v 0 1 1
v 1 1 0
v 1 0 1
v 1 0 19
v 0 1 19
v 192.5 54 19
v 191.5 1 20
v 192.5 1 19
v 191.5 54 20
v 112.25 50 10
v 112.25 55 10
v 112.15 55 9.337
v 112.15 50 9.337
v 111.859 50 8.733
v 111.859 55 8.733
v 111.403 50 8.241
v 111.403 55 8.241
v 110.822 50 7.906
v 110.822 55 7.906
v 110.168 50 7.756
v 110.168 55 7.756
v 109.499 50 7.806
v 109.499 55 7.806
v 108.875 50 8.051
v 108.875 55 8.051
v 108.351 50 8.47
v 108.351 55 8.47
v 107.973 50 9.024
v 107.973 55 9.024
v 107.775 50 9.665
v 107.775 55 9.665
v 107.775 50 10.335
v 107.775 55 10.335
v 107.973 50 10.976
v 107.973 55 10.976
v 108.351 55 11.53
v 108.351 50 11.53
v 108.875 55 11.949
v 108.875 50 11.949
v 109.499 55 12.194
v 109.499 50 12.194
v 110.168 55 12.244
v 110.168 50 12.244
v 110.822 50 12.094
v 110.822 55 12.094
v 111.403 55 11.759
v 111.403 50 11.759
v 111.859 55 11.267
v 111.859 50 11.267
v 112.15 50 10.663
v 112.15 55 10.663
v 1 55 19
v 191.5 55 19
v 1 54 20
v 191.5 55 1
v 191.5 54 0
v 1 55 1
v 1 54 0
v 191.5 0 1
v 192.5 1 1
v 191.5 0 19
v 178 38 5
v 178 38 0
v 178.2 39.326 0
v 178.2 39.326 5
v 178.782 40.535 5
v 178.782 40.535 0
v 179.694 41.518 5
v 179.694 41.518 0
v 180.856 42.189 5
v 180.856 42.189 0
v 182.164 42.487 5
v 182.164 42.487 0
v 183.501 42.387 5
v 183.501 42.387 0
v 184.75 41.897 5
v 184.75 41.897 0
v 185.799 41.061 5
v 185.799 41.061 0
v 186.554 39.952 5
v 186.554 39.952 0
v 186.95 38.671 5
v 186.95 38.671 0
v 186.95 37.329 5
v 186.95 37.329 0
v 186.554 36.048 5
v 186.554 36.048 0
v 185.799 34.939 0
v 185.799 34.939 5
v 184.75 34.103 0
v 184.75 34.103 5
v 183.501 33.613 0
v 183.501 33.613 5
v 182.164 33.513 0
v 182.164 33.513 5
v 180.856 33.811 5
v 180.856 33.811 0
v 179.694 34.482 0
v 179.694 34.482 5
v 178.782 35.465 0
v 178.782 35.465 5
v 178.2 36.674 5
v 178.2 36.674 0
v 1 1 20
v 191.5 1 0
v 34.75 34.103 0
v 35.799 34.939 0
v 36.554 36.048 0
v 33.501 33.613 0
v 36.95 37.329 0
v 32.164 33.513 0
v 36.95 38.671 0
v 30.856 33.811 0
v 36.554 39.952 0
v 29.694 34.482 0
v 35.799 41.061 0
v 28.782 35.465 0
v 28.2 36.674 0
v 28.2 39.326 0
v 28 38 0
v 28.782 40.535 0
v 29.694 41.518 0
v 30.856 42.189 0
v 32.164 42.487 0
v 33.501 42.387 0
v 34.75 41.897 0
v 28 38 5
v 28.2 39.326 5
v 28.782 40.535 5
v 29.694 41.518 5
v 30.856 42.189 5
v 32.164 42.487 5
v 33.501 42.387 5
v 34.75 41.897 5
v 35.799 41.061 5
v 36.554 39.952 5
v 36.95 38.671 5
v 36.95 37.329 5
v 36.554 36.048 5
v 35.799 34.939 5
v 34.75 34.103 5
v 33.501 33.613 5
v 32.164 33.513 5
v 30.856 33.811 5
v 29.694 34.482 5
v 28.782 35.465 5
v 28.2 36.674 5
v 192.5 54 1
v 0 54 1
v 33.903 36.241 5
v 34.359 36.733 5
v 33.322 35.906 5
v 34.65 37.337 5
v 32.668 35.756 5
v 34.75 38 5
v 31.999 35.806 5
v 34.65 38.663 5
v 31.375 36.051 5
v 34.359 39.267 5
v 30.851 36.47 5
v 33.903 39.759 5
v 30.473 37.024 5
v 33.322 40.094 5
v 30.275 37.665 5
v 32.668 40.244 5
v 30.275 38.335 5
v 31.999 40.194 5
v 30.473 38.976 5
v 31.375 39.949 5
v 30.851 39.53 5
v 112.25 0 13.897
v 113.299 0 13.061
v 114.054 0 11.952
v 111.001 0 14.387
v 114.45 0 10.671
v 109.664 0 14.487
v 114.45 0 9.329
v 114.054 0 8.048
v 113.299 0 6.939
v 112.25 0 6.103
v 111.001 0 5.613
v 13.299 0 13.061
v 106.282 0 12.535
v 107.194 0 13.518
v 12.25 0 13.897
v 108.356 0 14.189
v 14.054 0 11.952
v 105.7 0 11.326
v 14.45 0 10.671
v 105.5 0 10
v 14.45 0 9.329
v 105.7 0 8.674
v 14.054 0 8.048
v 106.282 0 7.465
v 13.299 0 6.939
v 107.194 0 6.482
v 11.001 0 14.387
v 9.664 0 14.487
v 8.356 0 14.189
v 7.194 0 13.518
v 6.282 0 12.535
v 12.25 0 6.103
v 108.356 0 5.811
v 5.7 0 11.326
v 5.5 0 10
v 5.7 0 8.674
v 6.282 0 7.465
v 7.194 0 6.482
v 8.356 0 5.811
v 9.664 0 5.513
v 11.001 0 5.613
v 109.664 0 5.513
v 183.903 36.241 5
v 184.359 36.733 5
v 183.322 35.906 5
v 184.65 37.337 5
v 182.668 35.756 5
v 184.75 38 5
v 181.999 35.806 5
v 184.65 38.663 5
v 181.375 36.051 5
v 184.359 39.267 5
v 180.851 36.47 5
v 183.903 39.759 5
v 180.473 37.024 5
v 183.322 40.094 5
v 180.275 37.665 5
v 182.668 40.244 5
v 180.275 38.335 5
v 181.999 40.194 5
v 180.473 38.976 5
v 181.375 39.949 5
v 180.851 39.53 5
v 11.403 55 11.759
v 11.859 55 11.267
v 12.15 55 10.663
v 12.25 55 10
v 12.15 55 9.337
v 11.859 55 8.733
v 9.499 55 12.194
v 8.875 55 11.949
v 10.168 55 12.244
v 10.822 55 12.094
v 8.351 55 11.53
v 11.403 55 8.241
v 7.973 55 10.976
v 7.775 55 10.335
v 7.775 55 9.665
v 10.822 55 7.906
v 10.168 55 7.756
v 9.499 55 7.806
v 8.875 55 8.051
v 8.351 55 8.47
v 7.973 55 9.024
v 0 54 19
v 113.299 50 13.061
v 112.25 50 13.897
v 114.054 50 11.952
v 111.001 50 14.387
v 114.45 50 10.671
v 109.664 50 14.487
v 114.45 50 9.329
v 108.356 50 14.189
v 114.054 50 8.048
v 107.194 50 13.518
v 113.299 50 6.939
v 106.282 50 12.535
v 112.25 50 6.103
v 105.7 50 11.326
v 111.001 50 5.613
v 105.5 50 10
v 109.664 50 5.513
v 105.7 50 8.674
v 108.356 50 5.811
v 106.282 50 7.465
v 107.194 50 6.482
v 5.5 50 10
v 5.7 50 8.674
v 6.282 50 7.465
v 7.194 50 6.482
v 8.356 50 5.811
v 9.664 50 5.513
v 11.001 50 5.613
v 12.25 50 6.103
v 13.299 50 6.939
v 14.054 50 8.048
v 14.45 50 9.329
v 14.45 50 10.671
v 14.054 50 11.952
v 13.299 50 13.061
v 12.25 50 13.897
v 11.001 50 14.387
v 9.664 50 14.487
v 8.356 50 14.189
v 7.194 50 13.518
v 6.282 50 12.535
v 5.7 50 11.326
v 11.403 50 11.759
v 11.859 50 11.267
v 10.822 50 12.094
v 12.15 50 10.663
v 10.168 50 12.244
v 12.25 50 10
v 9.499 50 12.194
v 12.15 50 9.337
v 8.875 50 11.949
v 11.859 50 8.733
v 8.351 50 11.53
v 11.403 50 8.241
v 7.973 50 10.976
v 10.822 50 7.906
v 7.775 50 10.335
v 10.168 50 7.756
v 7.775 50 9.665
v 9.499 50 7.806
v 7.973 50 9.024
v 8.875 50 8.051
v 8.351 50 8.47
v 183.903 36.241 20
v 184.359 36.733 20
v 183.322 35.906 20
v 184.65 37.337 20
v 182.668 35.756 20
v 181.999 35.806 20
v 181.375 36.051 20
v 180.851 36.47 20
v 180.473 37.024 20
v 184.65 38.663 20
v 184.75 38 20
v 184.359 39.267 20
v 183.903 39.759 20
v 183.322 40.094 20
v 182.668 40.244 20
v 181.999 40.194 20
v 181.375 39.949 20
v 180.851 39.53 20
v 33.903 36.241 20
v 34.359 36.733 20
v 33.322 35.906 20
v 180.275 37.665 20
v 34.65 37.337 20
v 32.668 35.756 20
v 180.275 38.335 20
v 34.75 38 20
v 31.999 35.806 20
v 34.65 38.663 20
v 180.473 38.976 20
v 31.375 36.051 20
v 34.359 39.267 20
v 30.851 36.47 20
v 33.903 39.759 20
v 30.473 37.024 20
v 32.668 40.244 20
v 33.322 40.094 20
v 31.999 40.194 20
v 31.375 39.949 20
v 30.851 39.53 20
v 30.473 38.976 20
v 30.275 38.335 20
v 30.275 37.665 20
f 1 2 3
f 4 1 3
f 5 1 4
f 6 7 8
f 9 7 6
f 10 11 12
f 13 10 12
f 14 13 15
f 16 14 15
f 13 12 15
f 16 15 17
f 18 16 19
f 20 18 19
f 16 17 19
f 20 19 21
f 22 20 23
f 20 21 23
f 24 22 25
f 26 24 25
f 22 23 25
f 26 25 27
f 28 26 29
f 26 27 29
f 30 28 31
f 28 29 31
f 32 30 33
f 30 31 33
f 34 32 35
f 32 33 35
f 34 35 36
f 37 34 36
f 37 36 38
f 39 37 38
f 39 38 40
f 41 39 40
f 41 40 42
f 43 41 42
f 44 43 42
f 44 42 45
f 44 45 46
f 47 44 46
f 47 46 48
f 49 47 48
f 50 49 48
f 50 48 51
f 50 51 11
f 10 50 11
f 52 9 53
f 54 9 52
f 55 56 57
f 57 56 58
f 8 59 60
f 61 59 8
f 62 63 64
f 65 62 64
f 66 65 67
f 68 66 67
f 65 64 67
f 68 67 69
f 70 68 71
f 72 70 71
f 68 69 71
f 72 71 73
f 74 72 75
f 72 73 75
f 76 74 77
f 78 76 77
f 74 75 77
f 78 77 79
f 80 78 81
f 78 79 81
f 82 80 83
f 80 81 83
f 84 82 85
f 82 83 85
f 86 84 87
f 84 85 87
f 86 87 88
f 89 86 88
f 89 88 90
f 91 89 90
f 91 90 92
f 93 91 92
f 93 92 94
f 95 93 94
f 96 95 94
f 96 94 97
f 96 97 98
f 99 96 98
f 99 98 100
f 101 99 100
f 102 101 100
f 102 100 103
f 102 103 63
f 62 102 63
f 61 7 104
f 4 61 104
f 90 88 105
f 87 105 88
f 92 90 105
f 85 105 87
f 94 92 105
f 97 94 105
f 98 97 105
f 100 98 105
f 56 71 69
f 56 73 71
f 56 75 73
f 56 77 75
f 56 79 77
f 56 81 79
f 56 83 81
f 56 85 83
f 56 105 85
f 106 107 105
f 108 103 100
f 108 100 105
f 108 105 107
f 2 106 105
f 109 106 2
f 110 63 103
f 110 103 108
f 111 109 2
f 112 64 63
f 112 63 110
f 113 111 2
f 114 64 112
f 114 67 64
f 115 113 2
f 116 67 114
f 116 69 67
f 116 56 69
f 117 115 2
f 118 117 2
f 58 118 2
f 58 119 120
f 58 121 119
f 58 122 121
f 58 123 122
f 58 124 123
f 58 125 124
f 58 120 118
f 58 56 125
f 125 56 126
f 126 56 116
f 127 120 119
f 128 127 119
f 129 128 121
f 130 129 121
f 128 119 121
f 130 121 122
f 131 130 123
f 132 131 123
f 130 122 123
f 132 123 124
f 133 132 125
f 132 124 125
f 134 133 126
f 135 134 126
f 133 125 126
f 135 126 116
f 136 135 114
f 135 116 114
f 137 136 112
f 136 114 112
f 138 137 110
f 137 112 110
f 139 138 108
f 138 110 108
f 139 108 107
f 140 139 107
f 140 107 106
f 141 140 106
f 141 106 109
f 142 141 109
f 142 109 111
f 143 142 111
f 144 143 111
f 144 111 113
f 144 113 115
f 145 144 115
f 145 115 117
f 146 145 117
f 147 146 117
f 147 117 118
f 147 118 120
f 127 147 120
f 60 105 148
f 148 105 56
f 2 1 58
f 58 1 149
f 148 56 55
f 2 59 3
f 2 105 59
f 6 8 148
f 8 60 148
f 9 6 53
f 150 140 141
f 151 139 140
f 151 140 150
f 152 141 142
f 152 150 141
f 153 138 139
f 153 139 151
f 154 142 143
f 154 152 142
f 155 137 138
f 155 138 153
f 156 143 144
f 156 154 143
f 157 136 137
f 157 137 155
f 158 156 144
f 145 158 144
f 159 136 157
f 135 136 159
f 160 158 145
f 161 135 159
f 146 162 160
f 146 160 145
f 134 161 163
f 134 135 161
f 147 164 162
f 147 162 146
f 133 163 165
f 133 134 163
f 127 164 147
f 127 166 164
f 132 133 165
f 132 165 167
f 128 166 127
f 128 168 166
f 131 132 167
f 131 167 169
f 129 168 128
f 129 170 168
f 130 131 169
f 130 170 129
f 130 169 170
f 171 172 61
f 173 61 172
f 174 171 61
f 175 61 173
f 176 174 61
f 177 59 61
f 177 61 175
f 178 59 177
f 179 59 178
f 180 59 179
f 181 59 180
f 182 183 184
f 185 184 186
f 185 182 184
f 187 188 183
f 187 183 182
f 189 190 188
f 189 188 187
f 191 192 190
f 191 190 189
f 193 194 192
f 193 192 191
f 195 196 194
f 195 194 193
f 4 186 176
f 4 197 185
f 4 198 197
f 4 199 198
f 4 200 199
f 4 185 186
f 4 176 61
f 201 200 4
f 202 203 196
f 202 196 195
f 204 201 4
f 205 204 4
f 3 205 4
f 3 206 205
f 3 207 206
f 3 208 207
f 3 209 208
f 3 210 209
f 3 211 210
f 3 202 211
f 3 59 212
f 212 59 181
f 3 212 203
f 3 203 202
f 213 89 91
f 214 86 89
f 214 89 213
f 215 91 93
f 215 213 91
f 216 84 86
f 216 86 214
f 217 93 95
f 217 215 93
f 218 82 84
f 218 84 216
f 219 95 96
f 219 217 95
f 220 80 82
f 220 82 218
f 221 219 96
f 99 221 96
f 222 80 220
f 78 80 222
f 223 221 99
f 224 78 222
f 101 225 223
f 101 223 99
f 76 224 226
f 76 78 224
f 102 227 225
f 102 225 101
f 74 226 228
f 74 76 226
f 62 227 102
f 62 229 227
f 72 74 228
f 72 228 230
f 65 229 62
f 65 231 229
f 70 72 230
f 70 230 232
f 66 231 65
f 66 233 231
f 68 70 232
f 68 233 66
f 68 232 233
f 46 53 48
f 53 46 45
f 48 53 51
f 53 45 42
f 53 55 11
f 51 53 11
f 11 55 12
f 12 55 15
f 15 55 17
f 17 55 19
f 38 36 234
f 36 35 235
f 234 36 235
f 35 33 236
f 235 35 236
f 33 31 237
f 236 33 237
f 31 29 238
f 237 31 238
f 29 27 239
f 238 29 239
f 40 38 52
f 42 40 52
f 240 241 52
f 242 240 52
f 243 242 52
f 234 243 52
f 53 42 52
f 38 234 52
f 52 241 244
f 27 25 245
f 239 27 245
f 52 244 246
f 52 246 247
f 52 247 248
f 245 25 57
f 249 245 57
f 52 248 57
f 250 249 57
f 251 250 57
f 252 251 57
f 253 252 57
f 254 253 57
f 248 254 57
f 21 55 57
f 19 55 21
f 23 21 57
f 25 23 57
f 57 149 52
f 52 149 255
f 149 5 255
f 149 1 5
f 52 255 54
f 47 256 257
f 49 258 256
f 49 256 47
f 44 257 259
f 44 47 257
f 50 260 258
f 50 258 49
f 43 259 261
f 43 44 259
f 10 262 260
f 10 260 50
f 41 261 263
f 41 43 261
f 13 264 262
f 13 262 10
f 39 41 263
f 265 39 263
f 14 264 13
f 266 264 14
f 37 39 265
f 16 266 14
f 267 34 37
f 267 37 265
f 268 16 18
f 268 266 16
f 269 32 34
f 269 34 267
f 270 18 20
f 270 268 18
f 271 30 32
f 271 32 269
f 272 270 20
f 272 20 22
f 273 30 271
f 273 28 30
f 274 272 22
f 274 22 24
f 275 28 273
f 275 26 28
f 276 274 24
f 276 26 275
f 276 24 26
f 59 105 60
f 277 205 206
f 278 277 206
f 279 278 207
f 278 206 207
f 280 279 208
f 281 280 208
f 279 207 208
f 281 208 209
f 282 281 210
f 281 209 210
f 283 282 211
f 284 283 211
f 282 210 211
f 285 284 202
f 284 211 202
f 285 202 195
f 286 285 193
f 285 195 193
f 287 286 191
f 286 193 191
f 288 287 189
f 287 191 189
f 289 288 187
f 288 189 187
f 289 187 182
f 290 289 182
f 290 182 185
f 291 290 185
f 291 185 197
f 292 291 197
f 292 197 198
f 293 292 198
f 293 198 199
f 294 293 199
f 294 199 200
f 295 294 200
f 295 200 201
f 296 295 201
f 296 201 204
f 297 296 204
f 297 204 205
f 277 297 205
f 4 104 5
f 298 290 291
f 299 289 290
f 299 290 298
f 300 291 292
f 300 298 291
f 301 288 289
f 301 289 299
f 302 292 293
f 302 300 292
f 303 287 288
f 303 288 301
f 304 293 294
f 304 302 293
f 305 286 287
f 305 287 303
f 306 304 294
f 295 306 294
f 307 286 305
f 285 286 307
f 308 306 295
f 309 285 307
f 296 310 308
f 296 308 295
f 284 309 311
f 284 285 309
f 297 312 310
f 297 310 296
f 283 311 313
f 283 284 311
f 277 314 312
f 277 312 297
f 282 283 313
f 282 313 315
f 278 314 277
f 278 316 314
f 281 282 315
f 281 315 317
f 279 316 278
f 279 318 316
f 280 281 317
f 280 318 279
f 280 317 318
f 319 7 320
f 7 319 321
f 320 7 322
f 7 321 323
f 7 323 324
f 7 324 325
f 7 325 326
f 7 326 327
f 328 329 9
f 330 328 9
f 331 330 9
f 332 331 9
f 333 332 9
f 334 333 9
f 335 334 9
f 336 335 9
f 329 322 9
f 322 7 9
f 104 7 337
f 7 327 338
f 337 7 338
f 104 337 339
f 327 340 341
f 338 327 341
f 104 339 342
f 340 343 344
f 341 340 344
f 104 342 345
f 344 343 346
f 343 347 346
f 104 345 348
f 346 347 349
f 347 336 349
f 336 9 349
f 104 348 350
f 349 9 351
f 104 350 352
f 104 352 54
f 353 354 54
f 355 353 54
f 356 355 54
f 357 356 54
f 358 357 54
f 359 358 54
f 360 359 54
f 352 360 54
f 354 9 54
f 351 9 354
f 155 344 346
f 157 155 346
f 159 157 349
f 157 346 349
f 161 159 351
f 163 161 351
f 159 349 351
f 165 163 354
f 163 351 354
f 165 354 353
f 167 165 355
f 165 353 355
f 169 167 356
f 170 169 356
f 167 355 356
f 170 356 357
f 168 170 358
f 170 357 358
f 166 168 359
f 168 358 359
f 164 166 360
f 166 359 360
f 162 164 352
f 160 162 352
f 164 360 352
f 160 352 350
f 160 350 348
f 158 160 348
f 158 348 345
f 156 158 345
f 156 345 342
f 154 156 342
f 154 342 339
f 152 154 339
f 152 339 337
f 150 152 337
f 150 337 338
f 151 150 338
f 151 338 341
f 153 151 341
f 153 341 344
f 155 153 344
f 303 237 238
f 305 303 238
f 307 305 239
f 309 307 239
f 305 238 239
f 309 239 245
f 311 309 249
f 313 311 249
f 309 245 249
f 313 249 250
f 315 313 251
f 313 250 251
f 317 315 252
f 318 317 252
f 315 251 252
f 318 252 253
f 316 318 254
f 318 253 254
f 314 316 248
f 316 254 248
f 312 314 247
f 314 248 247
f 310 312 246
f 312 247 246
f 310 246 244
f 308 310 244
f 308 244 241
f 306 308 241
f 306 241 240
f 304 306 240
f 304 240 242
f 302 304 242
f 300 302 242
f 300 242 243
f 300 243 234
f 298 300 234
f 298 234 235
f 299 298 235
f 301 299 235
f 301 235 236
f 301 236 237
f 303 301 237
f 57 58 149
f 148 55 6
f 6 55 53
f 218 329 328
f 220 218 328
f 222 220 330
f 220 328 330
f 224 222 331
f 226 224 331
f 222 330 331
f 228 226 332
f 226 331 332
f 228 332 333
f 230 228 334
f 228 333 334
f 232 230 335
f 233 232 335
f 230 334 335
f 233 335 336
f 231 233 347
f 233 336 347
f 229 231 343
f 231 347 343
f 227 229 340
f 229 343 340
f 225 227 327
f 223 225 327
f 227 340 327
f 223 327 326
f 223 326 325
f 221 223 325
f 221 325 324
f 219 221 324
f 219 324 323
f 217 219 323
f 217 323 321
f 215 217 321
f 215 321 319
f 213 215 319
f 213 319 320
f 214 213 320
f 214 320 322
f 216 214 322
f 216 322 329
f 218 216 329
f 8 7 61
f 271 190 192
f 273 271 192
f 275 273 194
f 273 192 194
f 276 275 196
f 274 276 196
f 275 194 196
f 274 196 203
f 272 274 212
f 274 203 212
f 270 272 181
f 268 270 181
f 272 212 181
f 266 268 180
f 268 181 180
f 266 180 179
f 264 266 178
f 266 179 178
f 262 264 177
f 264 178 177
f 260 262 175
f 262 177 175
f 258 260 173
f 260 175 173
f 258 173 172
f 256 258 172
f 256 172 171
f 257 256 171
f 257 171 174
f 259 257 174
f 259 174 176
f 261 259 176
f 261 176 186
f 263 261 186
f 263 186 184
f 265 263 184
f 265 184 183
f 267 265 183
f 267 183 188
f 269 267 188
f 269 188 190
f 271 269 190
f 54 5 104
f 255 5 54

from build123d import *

# Parameters (mm, degrees)
SKETCH1_W                                        = 192.5
SKETCH1_H                                        = 55
BOSS_EXTRUDE1_DEPTH                              = 20
CBORE_FOR_M4_HEX_HEAD_MACHINE_SCREW1_D           = 4.5
CBORE_FOR_M4_HEX_HEAD_MACHINE_SCREW1_DEPTH       = 55
CBORE_FOR_M4_HEX_HEAD_MACHINE_SCREW1_CBORE_D     = 9
CBORE_FOR_M4_HEX_HEAD_MACHINE_SCREW1_CBORE_DEPTH = 50
CBORE_FOR_M4_HEX_HEAD_MACHINE_SCREW2_D           = 4.5
CBORE_FOR_M4_HEX_HEAD_MACHINE_SCREW2_DEPTH       = 20
CBORE_FOR_M4_HEX_HEAD_MACHINE_SCREW2_CBORE_D     = 9
CBORE_FOR_M4_HEX_HEAD_MACHINE_SCREW2_CBORE_DEPTH = 5
CHAMFER1_SIZE                                    = 1


with BuildPart() as part:
    # Sketch1 → Boss-Extrude1 (new body)
    with BuildSketch(Plane(origin=(0, 0, 0), x_dir=(-1, 0, 0), z_dir=(0, 0, -1))):
        with Locations((-96.25, 27.5)):
            Rectangle(SKETCH1_W, SKETCH1_H)
    extrude(amount=-BOSS_EXTRUDE1_DEPTH)

    # CBORE for M4 Hex Head Machine Screw1
    with Locations(Plane(origin=(0, 0, 0), x_dir=(-1, 0, 0), z_dir=(0, -1, 0))):
        with Locations((-110, -10), (-10, -10)):
            CounterBoreHole(CBORE_FOR_M4_HEX_HEAD_MACHINE_SCREW1_D / 2, CBORE_FOR_M4_HEX_HEAD_MACHINE_SCREW1_CBORE_D / 2, CBORE_FOR_M4_HEX_HEAD_MACHINE_SCREW1_CBORE_DEPTH, depth=CBORE_FOR_M4_HEX_HEAD_MACHINE_SCREW1_DEPTH)

    # CBORE for M4 Hex Head Machine Screw2
    with Locations(Plane(origin=(0, 0, 0), x_dir=(-1, 0, 0), z_dir=(0, 0, -1))):
        with Locations((-182.5, 38), (-32.5, 38)):
            CounterBoreHole(CBORE_FOR_M4_HEX_HEAD_MACHINE_SCREW2_D / 2, CBORE_FOR_M4_HEX_HEAD_MACHINE_SCREW2_CBORE_D / 2, CBORE_FOR_M4_HEX_HEAD_MACHINE_SCREW2_CBORE_DEPTH, depth=CBORE_FOR_M4_HEX_HEAD_MACHINE_SCREW2_DEPTH)

    # Chamfer1
    chamfer1_edges = [part.edges().sort_by_distance(p)[0] for p in [
        (192.5, 27.5, 20),
        (96.25, 0, 20),
        (0, 27.5, 20),
        (96.25, 0, 0),
        (192.5, 27.5, 0),
        (96.25, 55, 0),
        (0, 27.5, 0),
        (0, 0, 10),
        (192.5, 0, 10),
        (192.5, 55, 10),
        (0, 55, 10),
        (96.25, 55, 20),
    ]]
    chamfer(chamfer1_edges, length=CHAMFER1_SIZE)


solid = part.part
